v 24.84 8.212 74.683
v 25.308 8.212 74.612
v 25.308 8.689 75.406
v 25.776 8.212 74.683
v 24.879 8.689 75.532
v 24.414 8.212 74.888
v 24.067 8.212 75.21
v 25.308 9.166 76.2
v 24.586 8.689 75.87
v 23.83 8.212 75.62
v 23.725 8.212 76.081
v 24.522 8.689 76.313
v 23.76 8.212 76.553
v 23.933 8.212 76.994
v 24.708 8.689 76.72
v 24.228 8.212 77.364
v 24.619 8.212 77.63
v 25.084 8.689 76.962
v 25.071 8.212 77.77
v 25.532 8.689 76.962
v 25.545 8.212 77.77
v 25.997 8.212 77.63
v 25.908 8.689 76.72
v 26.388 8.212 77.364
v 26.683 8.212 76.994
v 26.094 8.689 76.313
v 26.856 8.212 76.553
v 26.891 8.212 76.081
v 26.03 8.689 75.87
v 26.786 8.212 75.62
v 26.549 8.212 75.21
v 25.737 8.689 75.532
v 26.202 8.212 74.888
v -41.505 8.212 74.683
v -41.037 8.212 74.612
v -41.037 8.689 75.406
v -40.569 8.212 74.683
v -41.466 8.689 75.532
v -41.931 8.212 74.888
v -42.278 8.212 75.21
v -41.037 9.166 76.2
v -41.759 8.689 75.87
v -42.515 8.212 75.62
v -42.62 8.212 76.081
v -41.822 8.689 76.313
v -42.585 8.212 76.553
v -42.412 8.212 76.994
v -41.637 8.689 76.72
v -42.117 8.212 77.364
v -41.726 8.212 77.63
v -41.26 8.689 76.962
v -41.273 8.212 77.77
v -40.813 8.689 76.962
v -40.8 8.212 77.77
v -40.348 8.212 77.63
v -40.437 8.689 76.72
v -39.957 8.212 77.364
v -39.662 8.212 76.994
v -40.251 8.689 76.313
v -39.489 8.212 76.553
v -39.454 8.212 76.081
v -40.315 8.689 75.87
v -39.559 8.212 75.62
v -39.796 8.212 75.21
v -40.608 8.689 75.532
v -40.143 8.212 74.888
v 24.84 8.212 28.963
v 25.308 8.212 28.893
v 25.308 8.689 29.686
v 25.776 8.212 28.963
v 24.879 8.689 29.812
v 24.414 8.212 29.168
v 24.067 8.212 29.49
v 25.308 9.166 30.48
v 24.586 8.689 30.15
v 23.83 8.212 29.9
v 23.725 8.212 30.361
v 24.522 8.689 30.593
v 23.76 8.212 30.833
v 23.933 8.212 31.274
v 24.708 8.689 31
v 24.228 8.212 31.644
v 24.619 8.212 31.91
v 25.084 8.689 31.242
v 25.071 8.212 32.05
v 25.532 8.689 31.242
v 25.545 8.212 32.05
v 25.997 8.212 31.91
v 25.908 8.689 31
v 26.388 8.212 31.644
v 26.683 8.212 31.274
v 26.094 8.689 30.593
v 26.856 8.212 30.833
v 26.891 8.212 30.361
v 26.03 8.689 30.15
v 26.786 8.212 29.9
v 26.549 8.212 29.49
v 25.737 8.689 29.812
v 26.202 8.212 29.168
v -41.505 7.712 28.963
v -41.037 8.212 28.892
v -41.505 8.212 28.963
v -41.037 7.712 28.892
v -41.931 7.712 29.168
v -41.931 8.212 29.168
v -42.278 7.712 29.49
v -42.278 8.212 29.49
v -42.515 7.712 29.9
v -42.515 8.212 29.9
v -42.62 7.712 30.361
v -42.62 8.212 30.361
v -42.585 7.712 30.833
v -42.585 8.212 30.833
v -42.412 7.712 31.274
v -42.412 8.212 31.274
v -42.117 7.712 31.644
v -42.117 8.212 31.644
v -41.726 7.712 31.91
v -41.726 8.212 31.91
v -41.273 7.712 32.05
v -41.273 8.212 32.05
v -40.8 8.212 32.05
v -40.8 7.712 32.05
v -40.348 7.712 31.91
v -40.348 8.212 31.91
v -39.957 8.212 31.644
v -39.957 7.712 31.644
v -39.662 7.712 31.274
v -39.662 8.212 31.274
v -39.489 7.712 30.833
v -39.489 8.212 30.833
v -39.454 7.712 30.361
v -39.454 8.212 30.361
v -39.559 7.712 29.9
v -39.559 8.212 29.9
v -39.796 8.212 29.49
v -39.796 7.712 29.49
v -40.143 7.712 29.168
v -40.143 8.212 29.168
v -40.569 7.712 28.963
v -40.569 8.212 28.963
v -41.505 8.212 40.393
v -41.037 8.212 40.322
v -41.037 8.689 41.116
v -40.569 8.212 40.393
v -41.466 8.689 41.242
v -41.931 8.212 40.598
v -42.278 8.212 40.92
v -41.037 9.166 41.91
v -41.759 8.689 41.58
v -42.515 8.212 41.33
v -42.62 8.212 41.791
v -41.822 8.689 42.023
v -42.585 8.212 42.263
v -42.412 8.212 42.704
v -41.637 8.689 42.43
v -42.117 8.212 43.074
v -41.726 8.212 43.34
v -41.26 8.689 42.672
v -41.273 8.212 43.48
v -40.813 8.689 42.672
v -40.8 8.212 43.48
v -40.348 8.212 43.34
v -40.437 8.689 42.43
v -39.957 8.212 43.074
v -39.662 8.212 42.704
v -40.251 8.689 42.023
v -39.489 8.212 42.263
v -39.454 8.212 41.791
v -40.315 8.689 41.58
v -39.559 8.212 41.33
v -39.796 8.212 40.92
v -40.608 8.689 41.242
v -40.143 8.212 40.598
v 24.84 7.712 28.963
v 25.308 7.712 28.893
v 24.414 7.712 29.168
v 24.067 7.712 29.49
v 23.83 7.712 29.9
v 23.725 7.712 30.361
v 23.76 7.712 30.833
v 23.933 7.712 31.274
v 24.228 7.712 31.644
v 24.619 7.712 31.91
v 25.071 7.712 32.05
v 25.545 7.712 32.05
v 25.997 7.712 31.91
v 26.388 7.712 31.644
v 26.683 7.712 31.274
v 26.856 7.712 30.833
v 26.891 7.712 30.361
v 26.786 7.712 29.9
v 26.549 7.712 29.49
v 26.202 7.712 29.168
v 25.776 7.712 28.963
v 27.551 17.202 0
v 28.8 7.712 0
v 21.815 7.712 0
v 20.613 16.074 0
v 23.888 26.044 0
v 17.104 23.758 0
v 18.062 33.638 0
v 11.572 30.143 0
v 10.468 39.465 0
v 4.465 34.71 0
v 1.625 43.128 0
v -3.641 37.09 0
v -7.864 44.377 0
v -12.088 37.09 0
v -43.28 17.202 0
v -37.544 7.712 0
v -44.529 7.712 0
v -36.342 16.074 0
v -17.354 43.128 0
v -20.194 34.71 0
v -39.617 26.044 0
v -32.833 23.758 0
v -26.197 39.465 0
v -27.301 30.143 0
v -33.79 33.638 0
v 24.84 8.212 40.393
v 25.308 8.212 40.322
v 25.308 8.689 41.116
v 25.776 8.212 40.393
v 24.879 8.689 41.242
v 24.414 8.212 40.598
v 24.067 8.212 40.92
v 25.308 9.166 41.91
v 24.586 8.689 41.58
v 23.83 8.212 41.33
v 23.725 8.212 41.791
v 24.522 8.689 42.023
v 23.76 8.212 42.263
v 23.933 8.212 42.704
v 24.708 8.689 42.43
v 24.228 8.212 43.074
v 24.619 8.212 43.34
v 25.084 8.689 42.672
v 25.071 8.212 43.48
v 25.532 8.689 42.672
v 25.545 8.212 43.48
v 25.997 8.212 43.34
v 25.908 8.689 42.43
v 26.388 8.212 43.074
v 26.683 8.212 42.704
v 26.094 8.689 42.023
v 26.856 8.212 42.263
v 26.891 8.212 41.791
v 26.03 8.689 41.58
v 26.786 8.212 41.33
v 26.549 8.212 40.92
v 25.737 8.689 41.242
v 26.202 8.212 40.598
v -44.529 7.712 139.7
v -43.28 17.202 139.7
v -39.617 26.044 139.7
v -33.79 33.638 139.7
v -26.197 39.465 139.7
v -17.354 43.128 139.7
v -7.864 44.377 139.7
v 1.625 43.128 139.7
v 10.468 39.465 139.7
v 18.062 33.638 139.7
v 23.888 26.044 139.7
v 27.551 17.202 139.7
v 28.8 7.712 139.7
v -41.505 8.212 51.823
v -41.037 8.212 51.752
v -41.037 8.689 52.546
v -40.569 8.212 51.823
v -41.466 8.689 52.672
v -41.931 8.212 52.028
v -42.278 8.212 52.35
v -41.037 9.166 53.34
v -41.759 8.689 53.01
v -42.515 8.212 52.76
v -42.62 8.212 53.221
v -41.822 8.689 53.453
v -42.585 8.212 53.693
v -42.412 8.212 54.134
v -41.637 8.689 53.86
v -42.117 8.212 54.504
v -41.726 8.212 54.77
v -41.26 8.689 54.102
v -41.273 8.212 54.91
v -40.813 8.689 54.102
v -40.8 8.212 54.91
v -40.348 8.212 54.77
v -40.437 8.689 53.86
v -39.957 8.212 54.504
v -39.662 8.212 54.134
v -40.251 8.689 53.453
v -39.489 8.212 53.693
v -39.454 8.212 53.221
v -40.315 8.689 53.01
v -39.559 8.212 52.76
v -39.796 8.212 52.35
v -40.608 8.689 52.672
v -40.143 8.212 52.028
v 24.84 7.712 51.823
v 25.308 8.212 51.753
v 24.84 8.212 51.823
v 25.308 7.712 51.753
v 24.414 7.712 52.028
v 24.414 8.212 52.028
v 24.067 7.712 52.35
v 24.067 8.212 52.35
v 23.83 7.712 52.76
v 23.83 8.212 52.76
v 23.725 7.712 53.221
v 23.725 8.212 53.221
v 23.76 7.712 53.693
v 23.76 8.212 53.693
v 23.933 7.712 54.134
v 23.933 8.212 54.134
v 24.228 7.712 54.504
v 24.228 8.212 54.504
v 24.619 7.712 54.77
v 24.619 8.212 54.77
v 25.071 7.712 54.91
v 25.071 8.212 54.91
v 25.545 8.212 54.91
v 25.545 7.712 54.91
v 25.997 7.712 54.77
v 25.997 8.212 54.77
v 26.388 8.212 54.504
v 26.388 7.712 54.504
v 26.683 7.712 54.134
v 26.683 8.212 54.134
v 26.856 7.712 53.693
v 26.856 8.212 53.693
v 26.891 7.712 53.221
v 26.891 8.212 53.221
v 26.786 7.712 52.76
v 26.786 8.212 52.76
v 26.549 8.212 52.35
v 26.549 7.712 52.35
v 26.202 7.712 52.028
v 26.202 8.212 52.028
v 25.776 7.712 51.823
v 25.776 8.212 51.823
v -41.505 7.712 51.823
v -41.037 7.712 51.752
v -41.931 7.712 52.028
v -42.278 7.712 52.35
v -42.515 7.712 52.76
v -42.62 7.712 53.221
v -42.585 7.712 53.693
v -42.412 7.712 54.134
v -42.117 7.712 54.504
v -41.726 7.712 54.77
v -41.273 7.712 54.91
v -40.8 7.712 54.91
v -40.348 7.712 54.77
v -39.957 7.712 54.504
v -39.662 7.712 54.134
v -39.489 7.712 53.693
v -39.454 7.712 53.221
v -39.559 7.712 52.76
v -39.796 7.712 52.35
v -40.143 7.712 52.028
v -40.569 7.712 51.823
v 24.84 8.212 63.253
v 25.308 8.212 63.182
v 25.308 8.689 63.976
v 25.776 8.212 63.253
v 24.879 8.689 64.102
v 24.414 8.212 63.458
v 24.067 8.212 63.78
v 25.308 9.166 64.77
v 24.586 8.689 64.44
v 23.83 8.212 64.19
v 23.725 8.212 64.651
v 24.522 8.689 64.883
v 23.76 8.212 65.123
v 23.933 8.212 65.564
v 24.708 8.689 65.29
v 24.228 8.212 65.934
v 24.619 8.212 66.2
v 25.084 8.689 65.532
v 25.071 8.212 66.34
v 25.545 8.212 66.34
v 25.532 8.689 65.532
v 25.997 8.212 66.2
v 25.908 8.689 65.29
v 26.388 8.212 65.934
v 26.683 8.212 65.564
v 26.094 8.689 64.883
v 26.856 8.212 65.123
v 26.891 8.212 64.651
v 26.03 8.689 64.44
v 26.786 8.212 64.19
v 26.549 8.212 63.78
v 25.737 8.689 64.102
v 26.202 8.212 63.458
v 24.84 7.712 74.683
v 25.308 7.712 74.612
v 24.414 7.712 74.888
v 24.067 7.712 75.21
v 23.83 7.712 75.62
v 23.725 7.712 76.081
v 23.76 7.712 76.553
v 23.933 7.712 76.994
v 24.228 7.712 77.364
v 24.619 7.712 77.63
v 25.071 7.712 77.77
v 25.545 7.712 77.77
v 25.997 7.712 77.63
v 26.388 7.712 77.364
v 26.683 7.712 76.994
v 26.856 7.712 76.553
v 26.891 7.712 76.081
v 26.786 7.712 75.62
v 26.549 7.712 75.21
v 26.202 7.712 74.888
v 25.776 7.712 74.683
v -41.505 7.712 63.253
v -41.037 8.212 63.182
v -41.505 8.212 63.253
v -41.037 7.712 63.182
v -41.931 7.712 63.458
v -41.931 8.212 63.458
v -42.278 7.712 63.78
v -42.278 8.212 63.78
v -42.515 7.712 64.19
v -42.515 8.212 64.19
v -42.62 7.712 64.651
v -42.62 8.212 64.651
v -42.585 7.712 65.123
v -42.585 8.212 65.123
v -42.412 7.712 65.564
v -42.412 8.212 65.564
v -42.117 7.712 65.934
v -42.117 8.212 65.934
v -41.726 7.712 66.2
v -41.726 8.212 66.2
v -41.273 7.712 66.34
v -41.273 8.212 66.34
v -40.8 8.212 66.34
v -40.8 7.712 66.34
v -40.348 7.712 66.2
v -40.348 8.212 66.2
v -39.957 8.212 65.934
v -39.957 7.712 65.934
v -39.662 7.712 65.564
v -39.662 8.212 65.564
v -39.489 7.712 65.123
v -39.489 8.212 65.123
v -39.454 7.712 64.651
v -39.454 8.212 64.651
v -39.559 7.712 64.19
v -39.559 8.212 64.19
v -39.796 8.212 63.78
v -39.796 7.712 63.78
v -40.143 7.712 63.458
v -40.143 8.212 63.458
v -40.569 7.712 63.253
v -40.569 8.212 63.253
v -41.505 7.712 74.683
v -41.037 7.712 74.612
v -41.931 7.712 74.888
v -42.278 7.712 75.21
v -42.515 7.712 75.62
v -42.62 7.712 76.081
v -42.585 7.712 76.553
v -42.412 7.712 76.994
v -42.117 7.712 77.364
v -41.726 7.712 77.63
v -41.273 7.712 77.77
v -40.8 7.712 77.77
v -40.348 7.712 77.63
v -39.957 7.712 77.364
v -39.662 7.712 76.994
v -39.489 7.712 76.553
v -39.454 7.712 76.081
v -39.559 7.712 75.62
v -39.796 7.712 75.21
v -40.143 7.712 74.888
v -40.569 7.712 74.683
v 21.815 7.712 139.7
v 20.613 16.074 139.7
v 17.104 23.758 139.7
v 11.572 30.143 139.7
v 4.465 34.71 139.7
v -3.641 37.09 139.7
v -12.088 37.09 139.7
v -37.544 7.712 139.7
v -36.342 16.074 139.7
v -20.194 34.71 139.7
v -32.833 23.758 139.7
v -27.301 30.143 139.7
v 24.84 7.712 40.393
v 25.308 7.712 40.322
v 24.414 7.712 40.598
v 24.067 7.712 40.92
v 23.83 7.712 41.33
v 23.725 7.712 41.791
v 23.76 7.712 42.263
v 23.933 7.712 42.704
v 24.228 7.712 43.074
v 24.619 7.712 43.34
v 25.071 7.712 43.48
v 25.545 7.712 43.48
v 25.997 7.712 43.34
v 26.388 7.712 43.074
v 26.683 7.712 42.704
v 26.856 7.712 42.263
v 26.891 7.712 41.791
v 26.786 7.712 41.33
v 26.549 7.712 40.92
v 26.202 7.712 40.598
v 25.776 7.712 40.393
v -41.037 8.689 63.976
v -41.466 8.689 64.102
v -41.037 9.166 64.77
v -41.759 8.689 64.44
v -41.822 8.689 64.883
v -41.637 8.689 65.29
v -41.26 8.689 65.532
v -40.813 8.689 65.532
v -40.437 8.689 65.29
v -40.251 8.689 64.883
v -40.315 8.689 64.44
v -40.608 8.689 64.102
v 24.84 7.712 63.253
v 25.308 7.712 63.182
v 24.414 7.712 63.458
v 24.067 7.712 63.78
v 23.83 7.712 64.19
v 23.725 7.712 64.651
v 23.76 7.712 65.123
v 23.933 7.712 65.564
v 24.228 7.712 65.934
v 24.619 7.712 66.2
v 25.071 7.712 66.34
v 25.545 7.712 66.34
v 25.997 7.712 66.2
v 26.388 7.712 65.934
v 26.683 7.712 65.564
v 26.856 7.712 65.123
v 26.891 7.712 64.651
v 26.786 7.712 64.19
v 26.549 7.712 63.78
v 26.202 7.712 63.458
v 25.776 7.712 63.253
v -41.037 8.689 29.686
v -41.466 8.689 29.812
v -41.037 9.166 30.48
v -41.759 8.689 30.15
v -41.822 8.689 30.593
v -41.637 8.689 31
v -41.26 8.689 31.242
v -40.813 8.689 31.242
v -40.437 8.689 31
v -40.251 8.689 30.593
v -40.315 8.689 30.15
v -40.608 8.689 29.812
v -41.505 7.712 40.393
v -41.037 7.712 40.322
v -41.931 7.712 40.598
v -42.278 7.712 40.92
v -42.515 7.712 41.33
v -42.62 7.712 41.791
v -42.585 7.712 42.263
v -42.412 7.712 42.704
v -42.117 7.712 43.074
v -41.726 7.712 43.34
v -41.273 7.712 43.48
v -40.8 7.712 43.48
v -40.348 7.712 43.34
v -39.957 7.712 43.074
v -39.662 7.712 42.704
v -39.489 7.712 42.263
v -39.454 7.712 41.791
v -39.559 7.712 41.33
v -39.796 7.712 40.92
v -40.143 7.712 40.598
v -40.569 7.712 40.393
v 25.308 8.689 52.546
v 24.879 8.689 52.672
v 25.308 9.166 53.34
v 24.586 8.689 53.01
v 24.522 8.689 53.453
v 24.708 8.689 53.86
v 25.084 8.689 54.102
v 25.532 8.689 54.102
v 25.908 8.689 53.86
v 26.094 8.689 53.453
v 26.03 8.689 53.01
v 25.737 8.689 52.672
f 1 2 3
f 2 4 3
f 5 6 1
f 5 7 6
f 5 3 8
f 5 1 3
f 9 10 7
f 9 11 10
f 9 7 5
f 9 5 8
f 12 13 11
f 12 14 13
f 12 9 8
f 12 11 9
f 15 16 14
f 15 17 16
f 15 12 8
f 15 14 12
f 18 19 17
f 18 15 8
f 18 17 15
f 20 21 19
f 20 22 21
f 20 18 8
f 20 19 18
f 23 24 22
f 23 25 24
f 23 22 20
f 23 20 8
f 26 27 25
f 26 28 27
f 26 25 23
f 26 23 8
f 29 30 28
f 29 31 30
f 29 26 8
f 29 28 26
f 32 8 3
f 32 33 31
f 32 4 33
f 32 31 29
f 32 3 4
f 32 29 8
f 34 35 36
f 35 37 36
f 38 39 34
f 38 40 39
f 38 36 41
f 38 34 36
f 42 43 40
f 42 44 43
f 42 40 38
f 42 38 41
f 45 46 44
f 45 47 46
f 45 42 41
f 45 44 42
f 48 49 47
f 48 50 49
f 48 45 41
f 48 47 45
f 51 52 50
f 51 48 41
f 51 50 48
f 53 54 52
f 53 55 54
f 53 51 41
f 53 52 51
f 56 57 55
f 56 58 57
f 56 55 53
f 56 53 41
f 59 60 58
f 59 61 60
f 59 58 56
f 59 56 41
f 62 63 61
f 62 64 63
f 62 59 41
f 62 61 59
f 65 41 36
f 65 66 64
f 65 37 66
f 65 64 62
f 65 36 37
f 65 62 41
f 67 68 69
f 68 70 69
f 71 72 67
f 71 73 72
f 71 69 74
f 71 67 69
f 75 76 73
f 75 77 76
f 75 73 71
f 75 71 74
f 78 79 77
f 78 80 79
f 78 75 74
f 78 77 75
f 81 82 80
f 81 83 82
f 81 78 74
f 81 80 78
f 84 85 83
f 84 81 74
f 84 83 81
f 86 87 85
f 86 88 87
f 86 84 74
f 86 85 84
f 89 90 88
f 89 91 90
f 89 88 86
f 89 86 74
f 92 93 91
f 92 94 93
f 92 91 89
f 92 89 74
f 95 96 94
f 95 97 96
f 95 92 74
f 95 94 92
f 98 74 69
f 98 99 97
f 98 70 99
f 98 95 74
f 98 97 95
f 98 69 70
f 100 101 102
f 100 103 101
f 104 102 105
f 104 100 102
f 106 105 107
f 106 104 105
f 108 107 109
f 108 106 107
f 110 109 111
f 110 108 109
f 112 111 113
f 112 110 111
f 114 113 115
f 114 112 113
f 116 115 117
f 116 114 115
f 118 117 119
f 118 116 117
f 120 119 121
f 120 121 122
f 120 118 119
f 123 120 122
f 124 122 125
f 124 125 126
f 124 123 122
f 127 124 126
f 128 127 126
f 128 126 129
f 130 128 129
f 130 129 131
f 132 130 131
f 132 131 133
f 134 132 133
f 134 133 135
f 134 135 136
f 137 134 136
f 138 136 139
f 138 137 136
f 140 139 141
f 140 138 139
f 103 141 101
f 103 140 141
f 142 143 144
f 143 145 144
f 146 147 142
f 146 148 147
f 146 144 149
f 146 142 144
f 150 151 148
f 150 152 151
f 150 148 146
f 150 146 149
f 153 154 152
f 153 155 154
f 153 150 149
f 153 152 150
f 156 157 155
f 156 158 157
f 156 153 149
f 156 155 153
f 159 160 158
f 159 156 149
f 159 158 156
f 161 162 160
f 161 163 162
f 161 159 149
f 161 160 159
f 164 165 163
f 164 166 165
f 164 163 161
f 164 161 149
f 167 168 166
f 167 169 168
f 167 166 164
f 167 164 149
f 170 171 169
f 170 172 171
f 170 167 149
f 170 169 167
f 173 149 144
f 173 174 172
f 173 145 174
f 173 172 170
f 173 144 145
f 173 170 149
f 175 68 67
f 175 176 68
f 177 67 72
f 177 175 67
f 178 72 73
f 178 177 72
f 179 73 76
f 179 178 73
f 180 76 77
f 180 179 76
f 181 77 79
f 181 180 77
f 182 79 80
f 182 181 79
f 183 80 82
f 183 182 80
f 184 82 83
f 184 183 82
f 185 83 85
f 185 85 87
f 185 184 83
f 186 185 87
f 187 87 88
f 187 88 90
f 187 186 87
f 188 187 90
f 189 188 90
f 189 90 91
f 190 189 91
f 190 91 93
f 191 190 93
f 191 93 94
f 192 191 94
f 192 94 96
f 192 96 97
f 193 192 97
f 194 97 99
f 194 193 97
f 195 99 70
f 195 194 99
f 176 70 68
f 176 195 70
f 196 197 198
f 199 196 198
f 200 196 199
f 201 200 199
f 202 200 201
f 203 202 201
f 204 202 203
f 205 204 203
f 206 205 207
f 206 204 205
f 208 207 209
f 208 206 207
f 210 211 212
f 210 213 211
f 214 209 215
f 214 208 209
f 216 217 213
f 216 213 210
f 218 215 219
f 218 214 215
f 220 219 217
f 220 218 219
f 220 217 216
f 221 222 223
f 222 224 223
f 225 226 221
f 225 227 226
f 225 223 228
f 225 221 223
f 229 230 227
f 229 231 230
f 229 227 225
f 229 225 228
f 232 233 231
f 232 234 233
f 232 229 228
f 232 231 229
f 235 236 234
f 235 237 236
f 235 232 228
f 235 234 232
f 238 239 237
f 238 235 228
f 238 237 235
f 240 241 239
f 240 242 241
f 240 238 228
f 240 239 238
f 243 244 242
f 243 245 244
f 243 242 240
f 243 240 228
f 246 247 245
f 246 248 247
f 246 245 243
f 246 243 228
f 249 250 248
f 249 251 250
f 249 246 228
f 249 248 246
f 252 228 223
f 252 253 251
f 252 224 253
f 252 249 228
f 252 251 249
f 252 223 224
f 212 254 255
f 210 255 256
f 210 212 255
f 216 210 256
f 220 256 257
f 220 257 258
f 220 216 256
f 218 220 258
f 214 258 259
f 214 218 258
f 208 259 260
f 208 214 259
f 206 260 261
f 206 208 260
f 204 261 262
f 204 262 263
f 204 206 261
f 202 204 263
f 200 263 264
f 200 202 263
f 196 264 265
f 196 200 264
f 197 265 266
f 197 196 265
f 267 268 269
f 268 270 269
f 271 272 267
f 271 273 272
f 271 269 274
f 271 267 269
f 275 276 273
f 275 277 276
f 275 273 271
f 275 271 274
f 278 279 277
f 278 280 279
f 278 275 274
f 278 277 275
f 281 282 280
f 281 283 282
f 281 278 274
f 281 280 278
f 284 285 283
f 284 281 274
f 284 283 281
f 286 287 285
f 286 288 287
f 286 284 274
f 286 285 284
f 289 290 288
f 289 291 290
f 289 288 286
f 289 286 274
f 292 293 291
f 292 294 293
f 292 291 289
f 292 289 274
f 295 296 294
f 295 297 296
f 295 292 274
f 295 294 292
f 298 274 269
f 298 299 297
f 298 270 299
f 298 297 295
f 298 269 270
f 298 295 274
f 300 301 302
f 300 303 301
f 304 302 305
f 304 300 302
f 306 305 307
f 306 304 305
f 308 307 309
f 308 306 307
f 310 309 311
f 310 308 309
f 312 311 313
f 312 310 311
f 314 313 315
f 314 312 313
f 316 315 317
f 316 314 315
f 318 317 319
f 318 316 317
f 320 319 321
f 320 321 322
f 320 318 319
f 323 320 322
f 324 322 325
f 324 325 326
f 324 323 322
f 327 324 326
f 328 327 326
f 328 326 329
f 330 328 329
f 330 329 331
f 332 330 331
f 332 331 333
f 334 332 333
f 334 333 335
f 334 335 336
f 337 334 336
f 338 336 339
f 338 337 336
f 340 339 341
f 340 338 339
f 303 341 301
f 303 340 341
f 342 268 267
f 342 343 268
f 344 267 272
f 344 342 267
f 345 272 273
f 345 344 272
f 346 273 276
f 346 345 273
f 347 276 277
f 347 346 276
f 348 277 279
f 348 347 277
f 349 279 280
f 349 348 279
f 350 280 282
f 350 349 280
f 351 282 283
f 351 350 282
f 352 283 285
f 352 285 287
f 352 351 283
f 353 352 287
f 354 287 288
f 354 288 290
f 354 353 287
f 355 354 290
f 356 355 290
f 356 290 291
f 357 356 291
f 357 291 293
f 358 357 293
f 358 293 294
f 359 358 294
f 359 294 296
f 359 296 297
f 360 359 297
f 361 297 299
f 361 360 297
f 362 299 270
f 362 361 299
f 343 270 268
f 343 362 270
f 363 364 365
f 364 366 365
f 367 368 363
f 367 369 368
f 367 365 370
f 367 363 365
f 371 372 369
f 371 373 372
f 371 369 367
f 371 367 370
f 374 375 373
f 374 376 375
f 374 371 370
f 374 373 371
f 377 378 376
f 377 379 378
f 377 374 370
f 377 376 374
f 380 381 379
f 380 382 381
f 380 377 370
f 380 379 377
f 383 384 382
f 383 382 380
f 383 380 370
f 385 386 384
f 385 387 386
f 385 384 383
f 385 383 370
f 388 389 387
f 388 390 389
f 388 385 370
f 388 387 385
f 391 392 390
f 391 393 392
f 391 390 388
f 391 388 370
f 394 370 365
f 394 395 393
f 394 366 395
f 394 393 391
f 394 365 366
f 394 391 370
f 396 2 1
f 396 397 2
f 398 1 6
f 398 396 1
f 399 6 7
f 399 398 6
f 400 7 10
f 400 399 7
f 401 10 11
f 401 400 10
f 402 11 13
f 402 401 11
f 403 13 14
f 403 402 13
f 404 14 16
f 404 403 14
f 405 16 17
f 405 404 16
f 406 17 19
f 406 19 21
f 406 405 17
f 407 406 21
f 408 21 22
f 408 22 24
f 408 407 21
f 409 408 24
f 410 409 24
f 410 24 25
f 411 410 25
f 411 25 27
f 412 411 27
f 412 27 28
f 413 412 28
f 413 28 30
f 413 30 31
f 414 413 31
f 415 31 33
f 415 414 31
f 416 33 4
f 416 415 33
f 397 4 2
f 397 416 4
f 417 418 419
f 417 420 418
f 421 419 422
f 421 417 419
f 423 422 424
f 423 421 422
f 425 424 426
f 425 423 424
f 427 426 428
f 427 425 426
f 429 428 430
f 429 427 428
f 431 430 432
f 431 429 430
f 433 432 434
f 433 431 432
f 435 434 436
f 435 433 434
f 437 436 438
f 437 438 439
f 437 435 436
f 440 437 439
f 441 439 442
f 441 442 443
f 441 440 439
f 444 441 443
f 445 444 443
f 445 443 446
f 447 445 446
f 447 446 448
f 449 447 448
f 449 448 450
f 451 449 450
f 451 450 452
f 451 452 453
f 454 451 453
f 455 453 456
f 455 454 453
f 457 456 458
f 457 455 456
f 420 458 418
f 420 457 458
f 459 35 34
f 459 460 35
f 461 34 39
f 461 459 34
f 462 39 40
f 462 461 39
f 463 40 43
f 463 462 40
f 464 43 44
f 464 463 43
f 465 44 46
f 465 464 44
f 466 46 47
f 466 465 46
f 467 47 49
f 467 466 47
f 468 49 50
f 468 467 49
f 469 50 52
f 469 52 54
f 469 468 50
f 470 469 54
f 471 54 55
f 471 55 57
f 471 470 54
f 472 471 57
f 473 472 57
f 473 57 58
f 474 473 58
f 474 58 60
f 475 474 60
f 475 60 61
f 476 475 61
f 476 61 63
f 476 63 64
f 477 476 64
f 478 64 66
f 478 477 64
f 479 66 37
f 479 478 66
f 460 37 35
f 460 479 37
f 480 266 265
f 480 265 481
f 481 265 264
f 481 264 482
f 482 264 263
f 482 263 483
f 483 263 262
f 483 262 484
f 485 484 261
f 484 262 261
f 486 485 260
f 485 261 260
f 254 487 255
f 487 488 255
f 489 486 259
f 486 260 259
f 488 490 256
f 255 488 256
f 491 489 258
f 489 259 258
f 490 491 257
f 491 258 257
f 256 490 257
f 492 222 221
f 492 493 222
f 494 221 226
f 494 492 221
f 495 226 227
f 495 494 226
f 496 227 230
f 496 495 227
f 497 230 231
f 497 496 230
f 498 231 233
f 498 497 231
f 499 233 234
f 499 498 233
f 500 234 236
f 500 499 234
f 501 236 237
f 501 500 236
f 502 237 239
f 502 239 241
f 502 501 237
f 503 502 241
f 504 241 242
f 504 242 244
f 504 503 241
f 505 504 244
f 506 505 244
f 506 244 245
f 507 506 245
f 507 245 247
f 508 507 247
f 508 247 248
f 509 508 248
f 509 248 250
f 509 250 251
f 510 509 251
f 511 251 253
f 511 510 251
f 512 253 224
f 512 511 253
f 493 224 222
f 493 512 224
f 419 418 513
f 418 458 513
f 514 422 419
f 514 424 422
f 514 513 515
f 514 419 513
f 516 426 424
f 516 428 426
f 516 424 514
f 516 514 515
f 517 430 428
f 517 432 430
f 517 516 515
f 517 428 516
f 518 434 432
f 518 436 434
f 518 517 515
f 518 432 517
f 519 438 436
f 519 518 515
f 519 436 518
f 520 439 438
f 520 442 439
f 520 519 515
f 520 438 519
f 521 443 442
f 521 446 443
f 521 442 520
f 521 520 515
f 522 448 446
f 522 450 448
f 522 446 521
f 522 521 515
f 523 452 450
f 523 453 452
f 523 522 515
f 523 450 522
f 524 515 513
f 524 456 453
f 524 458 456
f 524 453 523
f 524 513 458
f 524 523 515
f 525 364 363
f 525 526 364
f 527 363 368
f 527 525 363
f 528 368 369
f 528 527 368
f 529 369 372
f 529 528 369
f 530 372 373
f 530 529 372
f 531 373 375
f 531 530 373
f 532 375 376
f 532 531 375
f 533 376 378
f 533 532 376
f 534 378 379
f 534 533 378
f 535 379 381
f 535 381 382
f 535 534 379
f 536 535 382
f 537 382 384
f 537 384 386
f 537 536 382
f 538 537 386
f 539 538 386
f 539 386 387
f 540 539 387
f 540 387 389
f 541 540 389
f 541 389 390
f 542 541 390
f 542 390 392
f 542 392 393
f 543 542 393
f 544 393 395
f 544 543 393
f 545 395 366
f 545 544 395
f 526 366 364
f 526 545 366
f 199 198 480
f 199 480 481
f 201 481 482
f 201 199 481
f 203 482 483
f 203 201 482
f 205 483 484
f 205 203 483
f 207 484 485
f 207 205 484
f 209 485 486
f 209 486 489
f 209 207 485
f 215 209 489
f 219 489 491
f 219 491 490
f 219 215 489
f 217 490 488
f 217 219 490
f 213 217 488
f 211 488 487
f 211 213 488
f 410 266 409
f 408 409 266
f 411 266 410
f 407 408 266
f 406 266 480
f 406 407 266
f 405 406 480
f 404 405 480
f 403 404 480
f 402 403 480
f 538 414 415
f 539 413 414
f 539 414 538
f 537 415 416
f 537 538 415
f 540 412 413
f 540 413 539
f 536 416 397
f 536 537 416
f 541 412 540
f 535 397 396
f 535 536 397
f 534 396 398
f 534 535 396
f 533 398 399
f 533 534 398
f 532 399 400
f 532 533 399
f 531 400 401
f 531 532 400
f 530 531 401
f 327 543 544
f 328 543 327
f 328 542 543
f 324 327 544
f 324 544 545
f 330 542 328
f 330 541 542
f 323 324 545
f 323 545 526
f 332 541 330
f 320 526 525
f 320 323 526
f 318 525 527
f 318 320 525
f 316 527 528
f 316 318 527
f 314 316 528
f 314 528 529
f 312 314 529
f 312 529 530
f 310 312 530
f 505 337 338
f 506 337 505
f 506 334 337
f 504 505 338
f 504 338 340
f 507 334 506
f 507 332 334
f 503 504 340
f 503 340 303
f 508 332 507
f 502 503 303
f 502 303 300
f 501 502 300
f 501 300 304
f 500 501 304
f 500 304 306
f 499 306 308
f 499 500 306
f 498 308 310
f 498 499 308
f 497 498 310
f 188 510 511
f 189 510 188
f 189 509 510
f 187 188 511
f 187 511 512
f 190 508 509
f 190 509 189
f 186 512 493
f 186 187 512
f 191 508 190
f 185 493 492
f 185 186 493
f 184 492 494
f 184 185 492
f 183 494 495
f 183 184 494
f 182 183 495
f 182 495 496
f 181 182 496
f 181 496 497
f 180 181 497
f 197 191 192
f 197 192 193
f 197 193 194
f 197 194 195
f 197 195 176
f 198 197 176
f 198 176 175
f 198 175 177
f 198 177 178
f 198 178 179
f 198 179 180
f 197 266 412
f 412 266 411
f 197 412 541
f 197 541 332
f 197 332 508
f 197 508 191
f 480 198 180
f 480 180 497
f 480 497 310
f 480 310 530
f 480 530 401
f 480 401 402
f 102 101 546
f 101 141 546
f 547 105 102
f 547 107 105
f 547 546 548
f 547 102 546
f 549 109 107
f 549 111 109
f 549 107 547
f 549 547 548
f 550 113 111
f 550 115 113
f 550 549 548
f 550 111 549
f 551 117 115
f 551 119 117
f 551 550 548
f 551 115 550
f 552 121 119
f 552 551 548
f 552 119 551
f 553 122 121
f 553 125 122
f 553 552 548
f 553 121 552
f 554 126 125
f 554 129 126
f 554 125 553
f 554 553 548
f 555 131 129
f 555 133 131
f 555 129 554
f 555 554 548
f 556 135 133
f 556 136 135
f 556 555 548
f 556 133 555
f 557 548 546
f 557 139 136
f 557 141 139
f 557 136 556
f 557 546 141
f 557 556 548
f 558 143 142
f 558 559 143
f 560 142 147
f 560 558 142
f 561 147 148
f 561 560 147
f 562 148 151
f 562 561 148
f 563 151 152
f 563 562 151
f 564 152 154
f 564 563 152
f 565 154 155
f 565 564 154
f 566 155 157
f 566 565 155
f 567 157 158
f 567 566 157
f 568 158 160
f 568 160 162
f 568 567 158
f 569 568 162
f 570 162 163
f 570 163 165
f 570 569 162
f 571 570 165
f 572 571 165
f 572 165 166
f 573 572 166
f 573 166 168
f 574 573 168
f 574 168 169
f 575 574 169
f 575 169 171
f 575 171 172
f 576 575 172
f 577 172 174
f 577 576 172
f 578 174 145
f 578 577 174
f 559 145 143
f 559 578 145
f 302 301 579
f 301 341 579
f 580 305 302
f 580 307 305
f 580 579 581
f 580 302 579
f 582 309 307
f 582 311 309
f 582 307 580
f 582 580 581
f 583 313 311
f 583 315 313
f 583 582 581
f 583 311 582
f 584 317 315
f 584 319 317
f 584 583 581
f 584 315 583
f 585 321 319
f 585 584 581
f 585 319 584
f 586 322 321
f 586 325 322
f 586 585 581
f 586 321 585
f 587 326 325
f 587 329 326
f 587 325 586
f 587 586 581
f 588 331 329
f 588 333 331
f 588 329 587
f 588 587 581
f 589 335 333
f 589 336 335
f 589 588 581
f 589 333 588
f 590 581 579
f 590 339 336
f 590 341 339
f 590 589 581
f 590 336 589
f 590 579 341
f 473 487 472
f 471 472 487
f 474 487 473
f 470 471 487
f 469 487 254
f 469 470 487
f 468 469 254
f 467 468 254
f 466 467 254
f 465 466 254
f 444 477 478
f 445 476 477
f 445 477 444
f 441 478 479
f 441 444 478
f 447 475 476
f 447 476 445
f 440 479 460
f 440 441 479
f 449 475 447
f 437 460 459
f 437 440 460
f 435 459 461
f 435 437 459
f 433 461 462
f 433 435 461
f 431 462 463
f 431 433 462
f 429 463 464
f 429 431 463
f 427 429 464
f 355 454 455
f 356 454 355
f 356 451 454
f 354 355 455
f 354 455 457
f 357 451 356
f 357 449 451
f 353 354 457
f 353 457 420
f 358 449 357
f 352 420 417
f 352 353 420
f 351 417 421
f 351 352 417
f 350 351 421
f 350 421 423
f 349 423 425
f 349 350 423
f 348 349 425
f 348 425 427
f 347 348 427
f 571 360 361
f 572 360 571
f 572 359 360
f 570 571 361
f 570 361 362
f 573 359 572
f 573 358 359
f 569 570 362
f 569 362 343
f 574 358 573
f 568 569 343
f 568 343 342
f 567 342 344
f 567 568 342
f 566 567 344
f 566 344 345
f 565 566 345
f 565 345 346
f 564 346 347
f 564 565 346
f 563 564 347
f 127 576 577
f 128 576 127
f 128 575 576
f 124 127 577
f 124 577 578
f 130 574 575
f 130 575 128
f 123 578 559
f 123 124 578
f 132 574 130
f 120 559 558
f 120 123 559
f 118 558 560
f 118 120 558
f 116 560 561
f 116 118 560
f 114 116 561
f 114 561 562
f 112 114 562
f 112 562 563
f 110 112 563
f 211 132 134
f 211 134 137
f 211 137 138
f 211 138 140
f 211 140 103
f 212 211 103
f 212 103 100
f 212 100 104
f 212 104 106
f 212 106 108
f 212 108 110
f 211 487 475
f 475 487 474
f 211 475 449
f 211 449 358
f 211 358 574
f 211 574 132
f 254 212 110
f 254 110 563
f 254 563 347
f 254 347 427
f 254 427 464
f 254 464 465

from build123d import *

# Parameters (mm, degrees)
BOSS_EXTRUDE1_DEPTH                   = 139.7
F_1_8_0_125_DIAMETER_HOLE1_AT_2_COUNT = 2
F_1_8_0_125_DIAMETER_HOLE1_AT_2_PITCH = 66.3448
LPATTERN1_COUNT                       = 5
LPATTERN1_PITCH                       = 11.43


with BuildPart() as part:
    # Sketch1 → Boss-Extrude1 (new body)
    with BuildSketch(Plane.XY):
        with BuildLine():
            Line((-37.544302716, 7.712013675), (-44.529302716, 7.712013675))
            ThreePointArc((-44.529302716, 7.712013675), (-7.864402716, 44.376913675), (28.800497284, 7.712013675))
            Line((28.800497284, 7.712013675), (21.815497284, 7.712013675))
            ThreePointArc((21.815497284, 7.712013675), (-7.864402716, 37.391913675), (-37.544302716, 7.712013675))
        make_face()
    extrude(amount=BOSS_EXTRUDE1_DEPTH)

    # Sketch4 → 1/8 (0.125) Diameter Hole1 (revolve, cut)
    with BuildSketch(Plane(origin=(-41.036802716, 7.712013675, 76.2), x_dir=(0, 0, -1), z_dir=(1, 0, 0))):
        Polygon((0, 0), (0, 1.453866233), (1.5875, 0.5), (1.5875, 0), align=None)
    f_1_8_0_125_diameter_hole1 = revolve(axis=Axis((-41.036802716, 1.362013675, 76.2), (0, 1, 0)), mode=Mode.SUBTRACT)

    # 1/8 (0.125) Diameter Hole1 at 2: 1/8 (0.125) Diameter Hole1 ×2
    with Locations(*[(i * F_1_8_0_125_DIAMETER_HOLE1_AT_2_PITCH, 0, 0) for i in range(1, F_1_8_0_125_DIAMETER_HOLE1_AT_2_COUNT)]):
        add(f_1_8_0_125_diameter_hole1, mode=Mode.SUBTRACT)

    # LPattern1: 1/8 (0.125) Diameter Hole1 ×5
    with Locations(*[(0, 0, -i * LPATTERN1_PITCH) for i in range(1, LPATTERN1_COUNT)]):
        add(f_1_8_0_125_diameter_hole1, mode=Mode.SUBTRACT)

    # LPattern1 copy 1 sketch → LPattern1 copy 1 (revolve, cut)
    with BuildSketch(Plane(origin=(25.307997284, 7.712013675, 64.77), x_dir=(0, 0, -1), z_dir=(1, 0, 0))):
        Polygon((0, 0), (0, 1.453866233), (1.5875, 0.5), (1.5875, 0), align=None)
    revolve(axis=Axis((25.307997284, 1.362013675, 64.77), (0, 1, 0)), mode=Mode.SUBTRACT)

    # LPattern1 copy 2 sketch → LPattern1 copy 2 (revolve, cut)
    with BuildSketch(Plane(origin=(25.307997284, 7.712013675, 53.34), x_dir=(0, 0, -1), z_dir=(1, 0, 0))):
        Polygon((0, 0), (0, 1.453866233), (1.5875, 0.5), (1.5875, 0), align=None)
    revolve(axis=Axis((25.307997284, 1.362013675, 53.34), (0, 1, 0)), mode=Mode.SUBTRACT)

    # LPattern1 copy 3 sketch → LPattern1 copy 3 (revolve, cut)
    with BuildSketch(Plane(origin=(25.307997284, 7.712013675, 41.91), x_dir=(0, 0, -1), z_dir=(1, 0, 0))):
        Polygon((0, 0), (0, 1.453866233), (1.5875, 0.5), (1.5875, 0), align=None)
    revolve(axis=Axis((25.307997284, 1.362013675, 41.91), (0, 1, 0)), mode=Mode.SUBTRACT)

    # LPattern1 copy 4 sketch → LPattern1 copy 4 (revolve, cut)
    with BuildSketch(Plane(origin=(25.307997284, 7.712013675, 30.48), x_dir=(0, 0, -1), z_dir=(1, 0, 0))):
        Polygon((0, 0), (0, 1.453866233), (1.5875, 0.5), (1.5875, 0), align=None)
    revolve(axis=Axis((25.307997284, 1.362013675, 30.48), (0, 1, 0)), mode=Mode.SUBTRACT)


solid = part.part
